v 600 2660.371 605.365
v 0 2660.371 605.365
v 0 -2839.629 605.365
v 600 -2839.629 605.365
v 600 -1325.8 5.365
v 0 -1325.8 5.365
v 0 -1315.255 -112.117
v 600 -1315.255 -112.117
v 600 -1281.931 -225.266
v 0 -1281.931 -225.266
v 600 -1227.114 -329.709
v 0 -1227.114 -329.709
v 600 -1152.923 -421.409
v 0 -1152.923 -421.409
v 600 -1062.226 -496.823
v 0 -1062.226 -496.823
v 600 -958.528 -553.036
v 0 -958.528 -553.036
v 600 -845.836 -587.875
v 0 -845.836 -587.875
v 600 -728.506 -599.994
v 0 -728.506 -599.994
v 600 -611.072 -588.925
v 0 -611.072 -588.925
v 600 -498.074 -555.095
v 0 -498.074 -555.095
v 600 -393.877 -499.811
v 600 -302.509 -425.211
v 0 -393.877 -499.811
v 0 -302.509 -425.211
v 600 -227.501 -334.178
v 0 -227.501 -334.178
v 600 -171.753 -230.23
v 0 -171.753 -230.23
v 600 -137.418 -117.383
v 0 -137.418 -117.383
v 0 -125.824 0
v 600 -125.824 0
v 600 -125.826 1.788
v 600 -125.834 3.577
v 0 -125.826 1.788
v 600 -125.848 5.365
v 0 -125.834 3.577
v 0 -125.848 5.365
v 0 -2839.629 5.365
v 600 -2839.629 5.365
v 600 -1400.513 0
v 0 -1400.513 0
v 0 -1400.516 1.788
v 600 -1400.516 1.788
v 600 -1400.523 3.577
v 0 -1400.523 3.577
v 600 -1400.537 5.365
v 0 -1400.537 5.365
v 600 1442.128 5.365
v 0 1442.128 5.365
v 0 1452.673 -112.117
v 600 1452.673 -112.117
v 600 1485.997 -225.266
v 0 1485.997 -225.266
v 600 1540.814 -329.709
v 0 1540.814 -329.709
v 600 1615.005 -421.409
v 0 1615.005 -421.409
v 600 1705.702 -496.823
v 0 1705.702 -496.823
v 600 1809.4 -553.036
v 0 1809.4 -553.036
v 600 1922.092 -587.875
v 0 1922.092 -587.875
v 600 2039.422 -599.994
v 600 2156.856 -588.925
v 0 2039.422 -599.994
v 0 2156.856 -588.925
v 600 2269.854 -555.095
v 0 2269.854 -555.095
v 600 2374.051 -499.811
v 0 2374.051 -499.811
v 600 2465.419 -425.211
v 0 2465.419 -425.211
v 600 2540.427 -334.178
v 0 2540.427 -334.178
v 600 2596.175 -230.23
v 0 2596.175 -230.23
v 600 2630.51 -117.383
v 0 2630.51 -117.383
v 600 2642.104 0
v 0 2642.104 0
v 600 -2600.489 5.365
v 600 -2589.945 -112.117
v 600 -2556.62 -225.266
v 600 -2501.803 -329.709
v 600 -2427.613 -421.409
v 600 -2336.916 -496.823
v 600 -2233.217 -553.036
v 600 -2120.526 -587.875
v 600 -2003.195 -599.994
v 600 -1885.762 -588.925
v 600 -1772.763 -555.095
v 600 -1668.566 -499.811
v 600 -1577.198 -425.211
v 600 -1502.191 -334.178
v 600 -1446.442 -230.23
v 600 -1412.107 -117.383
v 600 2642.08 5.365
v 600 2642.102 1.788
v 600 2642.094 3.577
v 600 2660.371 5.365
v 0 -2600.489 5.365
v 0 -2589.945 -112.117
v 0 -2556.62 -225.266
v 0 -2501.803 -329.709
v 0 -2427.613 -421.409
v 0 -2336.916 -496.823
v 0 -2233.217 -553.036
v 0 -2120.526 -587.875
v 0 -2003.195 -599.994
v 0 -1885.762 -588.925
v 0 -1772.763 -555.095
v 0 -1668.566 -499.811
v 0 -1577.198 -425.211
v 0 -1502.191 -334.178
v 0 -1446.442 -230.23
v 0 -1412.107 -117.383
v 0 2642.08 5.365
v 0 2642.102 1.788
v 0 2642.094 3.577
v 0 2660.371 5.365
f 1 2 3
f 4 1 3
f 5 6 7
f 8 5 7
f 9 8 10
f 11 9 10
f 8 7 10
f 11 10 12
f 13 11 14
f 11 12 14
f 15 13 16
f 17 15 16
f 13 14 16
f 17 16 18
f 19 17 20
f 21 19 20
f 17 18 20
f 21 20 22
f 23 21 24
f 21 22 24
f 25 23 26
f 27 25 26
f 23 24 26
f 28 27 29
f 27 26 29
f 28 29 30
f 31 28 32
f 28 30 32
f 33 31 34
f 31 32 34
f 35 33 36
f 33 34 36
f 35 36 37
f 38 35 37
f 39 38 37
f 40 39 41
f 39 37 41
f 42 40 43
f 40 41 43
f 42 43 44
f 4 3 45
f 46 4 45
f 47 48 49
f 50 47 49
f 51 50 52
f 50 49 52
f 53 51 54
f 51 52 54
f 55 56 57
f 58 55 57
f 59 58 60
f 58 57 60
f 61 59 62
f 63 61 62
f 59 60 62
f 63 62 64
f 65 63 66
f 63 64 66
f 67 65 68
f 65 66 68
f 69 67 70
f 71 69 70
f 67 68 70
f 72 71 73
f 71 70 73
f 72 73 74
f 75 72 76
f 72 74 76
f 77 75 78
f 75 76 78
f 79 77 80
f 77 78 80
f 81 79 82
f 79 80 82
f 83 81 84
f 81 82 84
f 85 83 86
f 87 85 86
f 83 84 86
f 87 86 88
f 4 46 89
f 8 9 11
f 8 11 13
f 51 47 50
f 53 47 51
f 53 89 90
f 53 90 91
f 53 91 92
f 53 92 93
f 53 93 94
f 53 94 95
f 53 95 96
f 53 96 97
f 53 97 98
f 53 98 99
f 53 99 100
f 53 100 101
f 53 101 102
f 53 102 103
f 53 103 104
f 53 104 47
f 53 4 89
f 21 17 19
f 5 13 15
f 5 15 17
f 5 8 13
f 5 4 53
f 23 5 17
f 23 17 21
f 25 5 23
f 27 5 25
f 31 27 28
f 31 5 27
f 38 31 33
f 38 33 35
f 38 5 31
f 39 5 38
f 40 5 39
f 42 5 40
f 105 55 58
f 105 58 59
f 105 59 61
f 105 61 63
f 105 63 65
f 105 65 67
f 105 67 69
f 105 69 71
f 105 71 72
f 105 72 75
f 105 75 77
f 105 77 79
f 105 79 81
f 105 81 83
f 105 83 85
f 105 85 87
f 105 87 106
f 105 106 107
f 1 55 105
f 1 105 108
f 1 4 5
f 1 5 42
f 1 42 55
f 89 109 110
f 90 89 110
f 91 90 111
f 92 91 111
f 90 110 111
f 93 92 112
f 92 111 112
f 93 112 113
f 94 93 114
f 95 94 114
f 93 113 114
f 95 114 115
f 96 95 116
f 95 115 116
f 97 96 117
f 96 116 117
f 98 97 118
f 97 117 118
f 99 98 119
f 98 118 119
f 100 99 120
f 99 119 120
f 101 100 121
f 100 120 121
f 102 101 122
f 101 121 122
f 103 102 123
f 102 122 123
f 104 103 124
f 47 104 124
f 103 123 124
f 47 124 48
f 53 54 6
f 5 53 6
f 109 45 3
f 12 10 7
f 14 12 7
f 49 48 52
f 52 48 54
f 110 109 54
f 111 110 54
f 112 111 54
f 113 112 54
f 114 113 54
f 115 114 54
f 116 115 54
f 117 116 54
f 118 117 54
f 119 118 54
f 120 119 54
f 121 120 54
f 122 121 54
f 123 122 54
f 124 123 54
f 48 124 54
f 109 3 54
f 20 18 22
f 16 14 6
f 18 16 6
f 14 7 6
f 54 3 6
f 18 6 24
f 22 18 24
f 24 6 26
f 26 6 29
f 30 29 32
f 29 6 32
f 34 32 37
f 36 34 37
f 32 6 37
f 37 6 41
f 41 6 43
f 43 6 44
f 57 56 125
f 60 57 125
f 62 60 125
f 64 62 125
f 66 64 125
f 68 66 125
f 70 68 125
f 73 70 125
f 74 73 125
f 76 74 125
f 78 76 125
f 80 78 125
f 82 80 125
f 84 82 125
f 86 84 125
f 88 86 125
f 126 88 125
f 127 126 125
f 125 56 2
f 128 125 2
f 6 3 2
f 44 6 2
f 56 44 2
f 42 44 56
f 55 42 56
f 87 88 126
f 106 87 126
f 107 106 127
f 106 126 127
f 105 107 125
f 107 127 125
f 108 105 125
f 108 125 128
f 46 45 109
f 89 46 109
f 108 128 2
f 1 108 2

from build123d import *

# Parameters (mm, degrees)
F1_DEPTH = 600


with BuildPart() as f1:
    # F0 (on Right) → F1 (new body)
    with BuildSketch(Plane.YZ):
        with BuildLine():
            ThreePointArc((-1400.512838, 0), (-1400.518835, 2.682629), (-1400.536827, 5.365205))
            Line((-1400.536827, 5.365205), (-2600.48885, 5.365205))
            ThreePointArc((-2600.48885, 5.365205), (-2003.195468, -599.994003), (-1400.512838, 0))
        make_face()
        with BuildLine():
            Line((-2600.48885, 5.365205), (-1400.536827, 5.365205))
            ThreePointArc((-1400.536827, 5.365205), (-2000.512838, 600), (-2600.48885, 5.365205))
        make_face()
        with BuildLine():
            ThreePointArc((1442.128471, 5.365205), (2042.104483, 600), (2642.080494, 5.365205))
            Line((2642.080494, 5.365205), (2660.37102, 5.365205))
            Line((2660.37102, 5.365205), (2660.37102, 605.365205))
            Line((2660.37102, 605.365205), (-2839.62898, 605.365205))
            Line((-2839.62898, 605.365205), (-2839.62898, 5.365205))
            Line((-2839.62898, 5.365205), (-2600.48885, 5.365205))
            ThreePointArc((-2600.48885, 5.365205), (-2000.512838, 600), (-1400.536827, 5.365205))
            Line((-1400.536827, 5.365205), (-1325.799533, 5.365205))
            ThreePointArc((-1325.799533, 5.365205), (-725.823522, 600), (-125.84751, 5.365205))
            Line((-125.84751, 5.365205), (1442.128471, 5.365205))
        make_face()
        with BuildLine():
            ThreePointArc((-125.823522, 0), (-125.829519, 2.682629), (-125.84751, 5.365205))
            Line((-125.84751, 5.365205), (-1325.799533, 5.365205))
            ThreePointArc((-1325.799533, 5.365205), (-728.506151, -599.994003), (-125.823522, 0))
        make_face()
        with BuildLine():
            Line((-1325.799533, 5.365205), (-125.84751, 5.365205))
            ThreePointArc((-125.84751, 5.365205), (-725.823522, 600), (-1325.799533, 5.365205))
        make_face()
        with BuildLine():
            ThreePointArc((1442.128471, 5.365205), (2039.421853, -599.994003), (2642.104483, 0))
            ThreePointArc((2642.104483, 0), (2642.098486, 2.682629), (2642.080494, 5.365205))
            Line((2642.080494, 5.365205), (1442.128471, 5.365205))
        make_face()
        with BuildLine():
            Line((1442.128471, 5.365205), (2642.080494, 5.365205))
            ThreePointArc((2642.080494, 5.365205), (2042.104483, 600), (1442.128471, 5.365205))
        make_face()
    extrude(amount=F1_DEPTH)


solid = f1.part
